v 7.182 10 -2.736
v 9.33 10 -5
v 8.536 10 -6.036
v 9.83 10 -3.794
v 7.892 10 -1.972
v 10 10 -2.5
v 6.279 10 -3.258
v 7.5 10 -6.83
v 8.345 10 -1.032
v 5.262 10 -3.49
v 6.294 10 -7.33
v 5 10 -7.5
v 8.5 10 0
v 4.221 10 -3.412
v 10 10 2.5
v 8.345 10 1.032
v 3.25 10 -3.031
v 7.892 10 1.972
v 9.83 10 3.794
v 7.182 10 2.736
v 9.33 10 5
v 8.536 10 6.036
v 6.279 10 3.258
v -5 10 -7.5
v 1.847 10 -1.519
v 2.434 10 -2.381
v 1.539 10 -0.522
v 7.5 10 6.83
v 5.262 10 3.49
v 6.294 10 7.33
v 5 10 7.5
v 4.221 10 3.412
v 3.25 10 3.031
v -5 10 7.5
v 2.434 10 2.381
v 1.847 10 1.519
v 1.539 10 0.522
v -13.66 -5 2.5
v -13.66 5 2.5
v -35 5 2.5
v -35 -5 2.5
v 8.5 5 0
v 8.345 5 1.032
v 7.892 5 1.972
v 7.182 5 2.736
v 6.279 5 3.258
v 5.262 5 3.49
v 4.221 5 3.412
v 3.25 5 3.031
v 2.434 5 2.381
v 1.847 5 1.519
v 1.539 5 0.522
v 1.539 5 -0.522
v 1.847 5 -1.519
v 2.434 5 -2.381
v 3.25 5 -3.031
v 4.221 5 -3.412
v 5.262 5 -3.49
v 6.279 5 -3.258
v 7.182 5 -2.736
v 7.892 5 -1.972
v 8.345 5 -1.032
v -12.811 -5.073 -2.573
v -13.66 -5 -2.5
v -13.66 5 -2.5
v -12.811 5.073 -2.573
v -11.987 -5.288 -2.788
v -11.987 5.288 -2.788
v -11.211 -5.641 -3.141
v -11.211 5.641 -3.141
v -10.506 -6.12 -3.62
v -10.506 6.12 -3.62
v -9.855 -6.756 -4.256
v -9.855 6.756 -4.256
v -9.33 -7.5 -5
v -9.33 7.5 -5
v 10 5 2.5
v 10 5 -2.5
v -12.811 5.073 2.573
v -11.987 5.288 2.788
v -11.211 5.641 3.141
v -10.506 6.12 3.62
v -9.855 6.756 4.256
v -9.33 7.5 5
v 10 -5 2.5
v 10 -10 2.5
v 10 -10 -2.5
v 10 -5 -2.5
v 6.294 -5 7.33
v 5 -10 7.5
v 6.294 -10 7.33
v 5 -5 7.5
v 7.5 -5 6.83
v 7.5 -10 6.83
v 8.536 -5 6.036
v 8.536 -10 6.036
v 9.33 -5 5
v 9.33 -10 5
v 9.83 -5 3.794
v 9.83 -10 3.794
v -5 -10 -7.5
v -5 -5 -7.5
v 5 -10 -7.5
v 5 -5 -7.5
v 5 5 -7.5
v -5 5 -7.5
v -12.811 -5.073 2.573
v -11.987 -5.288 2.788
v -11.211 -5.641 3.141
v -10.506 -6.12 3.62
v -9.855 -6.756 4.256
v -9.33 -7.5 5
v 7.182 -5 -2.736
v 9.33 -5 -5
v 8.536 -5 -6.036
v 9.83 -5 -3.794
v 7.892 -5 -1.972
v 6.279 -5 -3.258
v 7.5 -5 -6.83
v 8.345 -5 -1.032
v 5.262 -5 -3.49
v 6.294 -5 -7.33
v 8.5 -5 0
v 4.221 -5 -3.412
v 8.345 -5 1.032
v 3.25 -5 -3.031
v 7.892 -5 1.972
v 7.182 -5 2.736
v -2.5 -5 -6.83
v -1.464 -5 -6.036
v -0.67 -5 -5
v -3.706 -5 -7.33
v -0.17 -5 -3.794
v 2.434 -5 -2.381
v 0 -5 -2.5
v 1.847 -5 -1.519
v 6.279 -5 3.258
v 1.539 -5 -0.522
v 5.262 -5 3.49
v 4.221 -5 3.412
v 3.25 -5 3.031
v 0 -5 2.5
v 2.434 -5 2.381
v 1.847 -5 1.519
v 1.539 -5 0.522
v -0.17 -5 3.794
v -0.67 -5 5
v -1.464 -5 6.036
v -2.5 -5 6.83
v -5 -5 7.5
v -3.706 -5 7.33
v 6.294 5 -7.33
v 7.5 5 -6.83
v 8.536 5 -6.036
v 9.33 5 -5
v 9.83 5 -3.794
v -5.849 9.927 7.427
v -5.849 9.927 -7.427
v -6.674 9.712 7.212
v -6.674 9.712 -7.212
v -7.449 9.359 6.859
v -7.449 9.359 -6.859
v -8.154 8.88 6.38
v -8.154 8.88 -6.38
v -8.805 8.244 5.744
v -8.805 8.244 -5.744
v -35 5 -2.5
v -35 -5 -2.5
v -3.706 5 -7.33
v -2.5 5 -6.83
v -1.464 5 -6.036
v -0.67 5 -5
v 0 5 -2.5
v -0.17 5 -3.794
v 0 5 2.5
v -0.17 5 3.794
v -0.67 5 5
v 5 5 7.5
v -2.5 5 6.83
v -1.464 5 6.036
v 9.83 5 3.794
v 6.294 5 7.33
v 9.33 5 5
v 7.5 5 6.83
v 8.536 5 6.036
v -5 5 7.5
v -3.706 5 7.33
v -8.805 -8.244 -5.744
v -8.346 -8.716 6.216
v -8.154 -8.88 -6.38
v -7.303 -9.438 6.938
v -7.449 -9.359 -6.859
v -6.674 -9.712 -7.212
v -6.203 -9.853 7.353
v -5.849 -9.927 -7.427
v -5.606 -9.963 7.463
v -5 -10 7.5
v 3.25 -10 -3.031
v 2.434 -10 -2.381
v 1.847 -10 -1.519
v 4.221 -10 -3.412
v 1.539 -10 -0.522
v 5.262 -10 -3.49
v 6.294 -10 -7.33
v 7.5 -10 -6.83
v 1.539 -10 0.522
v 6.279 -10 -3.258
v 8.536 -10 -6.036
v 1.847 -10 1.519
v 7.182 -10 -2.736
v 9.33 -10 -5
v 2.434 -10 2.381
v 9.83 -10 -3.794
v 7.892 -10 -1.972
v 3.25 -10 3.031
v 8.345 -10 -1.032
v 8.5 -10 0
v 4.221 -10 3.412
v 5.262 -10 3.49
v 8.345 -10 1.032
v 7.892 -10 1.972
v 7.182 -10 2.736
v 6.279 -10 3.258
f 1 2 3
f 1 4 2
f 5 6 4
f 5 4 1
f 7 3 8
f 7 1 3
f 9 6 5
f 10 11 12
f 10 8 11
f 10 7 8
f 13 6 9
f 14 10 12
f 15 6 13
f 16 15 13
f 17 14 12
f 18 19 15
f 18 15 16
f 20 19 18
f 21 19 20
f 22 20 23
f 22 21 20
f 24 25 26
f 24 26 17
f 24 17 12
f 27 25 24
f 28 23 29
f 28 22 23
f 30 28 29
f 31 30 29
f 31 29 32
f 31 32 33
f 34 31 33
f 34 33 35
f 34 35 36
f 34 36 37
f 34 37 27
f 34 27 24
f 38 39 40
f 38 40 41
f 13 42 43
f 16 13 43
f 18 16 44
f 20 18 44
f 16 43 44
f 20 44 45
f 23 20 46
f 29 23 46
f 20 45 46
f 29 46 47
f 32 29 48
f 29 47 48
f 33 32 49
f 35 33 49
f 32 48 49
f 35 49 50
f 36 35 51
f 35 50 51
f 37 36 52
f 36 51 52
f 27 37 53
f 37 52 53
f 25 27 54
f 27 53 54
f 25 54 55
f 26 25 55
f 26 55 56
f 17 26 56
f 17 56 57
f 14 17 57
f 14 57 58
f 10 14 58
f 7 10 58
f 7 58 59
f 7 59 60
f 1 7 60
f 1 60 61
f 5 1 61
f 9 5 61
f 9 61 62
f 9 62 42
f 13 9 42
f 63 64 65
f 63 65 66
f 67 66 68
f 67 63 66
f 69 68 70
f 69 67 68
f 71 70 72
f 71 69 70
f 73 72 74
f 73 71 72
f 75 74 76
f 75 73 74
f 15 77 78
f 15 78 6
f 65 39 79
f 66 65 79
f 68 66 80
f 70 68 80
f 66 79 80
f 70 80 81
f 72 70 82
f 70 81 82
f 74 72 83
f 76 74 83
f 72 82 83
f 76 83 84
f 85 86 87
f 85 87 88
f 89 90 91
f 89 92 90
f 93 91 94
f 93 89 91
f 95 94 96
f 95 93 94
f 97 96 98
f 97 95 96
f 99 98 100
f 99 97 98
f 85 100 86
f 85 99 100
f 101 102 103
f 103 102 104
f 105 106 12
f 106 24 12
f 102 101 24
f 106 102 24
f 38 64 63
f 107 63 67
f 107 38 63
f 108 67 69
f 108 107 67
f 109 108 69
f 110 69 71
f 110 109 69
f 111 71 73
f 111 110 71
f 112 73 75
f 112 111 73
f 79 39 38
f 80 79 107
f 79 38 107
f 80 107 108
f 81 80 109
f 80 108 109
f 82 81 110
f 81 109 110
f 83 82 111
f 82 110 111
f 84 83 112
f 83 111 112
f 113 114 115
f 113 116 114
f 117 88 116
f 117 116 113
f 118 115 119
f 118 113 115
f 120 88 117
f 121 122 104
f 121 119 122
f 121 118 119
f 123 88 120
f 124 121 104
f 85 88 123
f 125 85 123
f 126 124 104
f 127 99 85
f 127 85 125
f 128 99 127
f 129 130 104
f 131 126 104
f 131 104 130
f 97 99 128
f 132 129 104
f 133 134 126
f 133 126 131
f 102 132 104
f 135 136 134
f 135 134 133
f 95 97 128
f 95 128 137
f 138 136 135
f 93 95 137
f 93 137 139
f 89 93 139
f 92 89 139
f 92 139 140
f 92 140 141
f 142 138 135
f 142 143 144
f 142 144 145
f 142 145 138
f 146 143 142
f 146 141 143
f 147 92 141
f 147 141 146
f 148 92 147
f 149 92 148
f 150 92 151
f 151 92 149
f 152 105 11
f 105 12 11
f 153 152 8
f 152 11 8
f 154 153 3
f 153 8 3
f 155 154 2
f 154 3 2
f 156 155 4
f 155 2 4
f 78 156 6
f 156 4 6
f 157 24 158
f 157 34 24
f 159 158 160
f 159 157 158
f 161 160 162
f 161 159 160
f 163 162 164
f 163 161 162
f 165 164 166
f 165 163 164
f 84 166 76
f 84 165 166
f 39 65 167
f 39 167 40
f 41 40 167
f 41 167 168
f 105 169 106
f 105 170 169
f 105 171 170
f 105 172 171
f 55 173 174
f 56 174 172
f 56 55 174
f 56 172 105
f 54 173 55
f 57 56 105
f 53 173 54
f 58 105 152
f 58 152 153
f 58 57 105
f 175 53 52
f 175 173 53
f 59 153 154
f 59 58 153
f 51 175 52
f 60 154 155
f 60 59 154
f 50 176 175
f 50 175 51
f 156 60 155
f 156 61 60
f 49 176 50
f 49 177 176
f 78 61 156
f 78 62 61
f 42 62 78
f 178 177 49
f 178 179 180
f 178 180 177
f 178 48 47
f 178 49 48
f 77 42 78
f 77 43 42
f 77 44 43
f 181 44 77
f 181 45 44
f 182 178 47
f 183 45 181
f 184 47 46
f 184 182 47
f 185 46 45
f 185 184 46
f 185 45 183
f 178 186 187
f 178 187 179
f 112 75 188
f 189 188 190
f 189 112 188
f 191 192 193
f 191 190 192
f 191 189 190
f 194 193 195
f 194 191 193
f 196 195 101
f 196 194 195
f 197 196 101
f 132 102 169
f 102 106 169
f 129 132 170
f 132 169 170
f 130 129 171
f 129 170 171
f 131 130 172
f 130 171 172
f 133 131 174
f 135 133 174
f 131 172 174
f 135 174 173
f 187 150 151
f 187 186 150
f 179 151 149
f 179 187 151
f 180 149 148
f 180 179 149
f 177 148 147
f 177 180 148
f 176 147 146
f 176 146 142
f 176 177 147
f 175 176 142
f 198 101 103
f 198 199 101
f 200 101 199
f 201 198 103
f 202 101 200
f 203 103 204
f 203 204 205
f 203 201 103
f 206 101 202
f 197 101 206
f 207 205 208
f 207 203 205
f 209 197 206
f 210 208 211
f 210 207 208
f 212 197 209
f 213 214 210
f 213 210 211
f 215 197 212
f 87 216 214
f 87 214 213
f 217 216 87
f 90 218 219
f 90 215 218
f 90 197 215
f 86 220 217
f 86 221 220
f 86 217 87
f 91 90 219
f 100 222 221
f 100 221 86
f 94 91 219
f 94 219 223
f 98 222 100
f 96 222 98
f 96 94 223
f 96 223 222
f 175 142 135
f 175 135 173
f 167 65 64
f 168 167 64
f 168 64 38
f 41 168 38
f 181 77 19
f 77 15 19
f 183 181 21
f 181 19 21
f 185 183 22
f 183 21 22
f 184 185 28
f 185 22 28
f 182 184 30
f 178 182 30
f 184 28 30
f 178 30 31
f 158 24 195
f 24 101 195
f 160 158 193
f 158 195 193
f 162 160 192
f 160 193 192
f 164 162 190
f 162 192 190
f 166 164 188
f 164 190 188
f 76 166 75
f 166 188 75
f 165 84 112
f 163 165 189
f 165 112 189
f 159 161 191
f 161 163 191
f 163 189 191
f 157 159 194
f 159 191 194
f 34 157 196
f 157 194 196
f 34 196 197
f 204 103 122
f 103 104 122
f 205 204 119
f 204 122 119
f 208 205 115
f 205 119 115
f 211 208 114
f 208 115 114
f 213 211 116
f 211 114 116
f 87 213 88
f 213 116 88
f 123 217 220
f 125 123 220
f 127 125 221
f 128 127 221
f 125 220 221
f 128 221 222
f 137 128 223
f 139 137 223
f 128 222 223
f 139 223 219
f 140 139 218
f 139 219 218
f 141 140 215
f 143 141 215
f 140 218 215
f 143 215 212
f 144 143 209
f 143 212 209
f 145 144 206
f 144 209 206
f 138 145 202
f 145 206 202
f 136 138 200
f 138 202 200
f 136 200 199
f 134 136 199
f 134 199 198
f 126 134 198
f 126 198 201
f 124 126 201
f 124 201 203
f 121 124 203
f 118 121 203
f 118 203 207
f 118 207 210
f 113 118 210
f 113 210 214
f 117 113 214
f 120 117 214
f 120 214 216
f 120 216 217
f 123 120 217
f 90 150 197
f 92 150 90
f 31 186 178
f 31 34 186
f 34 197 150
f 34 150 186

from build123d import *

# Parameters (mm, degrees)
F1_DEPTH = 7.5
F3_D     = 7
F4_R     = 5
F5_R     = 4.99999
F6_W     = 10
F6_H     = 5
F7_DEPTH = 25
F8_R     = 5


# Not quite as in the source:
# - a fillet or chamfer is up to 0.001 mm smaller than in the source, because OpenCascade refuses the exact size


with BuildPart() as f1:
    # F0 (on Top) → F1 (new body, symmetric)
    with BuildSketch(Plane.XY):
        Polygon((10, 10), (-10, 10), (-10, -10), (10, -10), (10, -5), (0, -5), (0, 5), (10, 5), align=None)
    extrude(amount=F1_DEPTH, both=True)

    # F3 (through all)
    with Locations(Plane(origin=(0, 10, 0), x_dir=(-1, 0, 0), z_dir=(0, 1, 0))):
        with Locations((-5, 0)):
            Hole(F3_D / 2)

    # F4
    f4_edges = [f1.edges().sort_by_distance(p)[0] for p in [
        (10, 7.5, 7.5),
        (10, 7.5, -7.5),
        (10, -7.5, 7.5),
        (10, -7.5, -7.5),
        (-10, 10, 0),
        (-10, 0, -7.5),
        (-10, -10, 0),
        (-10, 0, 7.5),
    ]]
    fillet(f4_edges, radius=F4_R)

    # F5 (radius 5 in the source; OpenCascade refuses exactly that, so slightly less here)
    f5_edges = [f1.edges().sort_by_distance(p)[0] for p in [
        (0, 0, 7.5),
        (0, 0, -7.5),
    ]]
    fillet(f5_edges, radius=F5_R)

    # F6 (on face) → F7 (join)
    with BuildSketch(Plane(origin=(-10, 0, 0), x_dir=(0, -1, 0), z_dir=(-1, 0, 0))):
        Rectangle(F6_W, F6_H)
    extrude(amount=F7_DEPTH)

    # F8
    f8_edges = [f1.edges().sort_by_distance(p)[0] for p in [
        (-10, 0, 2.5),
        (-10, -5, 0),
        (-10, 0, -2.5),
        (-10, 5, 0),
    ]]
    fillet(f8_edges, radius=F8_R)


solid = f1.part
